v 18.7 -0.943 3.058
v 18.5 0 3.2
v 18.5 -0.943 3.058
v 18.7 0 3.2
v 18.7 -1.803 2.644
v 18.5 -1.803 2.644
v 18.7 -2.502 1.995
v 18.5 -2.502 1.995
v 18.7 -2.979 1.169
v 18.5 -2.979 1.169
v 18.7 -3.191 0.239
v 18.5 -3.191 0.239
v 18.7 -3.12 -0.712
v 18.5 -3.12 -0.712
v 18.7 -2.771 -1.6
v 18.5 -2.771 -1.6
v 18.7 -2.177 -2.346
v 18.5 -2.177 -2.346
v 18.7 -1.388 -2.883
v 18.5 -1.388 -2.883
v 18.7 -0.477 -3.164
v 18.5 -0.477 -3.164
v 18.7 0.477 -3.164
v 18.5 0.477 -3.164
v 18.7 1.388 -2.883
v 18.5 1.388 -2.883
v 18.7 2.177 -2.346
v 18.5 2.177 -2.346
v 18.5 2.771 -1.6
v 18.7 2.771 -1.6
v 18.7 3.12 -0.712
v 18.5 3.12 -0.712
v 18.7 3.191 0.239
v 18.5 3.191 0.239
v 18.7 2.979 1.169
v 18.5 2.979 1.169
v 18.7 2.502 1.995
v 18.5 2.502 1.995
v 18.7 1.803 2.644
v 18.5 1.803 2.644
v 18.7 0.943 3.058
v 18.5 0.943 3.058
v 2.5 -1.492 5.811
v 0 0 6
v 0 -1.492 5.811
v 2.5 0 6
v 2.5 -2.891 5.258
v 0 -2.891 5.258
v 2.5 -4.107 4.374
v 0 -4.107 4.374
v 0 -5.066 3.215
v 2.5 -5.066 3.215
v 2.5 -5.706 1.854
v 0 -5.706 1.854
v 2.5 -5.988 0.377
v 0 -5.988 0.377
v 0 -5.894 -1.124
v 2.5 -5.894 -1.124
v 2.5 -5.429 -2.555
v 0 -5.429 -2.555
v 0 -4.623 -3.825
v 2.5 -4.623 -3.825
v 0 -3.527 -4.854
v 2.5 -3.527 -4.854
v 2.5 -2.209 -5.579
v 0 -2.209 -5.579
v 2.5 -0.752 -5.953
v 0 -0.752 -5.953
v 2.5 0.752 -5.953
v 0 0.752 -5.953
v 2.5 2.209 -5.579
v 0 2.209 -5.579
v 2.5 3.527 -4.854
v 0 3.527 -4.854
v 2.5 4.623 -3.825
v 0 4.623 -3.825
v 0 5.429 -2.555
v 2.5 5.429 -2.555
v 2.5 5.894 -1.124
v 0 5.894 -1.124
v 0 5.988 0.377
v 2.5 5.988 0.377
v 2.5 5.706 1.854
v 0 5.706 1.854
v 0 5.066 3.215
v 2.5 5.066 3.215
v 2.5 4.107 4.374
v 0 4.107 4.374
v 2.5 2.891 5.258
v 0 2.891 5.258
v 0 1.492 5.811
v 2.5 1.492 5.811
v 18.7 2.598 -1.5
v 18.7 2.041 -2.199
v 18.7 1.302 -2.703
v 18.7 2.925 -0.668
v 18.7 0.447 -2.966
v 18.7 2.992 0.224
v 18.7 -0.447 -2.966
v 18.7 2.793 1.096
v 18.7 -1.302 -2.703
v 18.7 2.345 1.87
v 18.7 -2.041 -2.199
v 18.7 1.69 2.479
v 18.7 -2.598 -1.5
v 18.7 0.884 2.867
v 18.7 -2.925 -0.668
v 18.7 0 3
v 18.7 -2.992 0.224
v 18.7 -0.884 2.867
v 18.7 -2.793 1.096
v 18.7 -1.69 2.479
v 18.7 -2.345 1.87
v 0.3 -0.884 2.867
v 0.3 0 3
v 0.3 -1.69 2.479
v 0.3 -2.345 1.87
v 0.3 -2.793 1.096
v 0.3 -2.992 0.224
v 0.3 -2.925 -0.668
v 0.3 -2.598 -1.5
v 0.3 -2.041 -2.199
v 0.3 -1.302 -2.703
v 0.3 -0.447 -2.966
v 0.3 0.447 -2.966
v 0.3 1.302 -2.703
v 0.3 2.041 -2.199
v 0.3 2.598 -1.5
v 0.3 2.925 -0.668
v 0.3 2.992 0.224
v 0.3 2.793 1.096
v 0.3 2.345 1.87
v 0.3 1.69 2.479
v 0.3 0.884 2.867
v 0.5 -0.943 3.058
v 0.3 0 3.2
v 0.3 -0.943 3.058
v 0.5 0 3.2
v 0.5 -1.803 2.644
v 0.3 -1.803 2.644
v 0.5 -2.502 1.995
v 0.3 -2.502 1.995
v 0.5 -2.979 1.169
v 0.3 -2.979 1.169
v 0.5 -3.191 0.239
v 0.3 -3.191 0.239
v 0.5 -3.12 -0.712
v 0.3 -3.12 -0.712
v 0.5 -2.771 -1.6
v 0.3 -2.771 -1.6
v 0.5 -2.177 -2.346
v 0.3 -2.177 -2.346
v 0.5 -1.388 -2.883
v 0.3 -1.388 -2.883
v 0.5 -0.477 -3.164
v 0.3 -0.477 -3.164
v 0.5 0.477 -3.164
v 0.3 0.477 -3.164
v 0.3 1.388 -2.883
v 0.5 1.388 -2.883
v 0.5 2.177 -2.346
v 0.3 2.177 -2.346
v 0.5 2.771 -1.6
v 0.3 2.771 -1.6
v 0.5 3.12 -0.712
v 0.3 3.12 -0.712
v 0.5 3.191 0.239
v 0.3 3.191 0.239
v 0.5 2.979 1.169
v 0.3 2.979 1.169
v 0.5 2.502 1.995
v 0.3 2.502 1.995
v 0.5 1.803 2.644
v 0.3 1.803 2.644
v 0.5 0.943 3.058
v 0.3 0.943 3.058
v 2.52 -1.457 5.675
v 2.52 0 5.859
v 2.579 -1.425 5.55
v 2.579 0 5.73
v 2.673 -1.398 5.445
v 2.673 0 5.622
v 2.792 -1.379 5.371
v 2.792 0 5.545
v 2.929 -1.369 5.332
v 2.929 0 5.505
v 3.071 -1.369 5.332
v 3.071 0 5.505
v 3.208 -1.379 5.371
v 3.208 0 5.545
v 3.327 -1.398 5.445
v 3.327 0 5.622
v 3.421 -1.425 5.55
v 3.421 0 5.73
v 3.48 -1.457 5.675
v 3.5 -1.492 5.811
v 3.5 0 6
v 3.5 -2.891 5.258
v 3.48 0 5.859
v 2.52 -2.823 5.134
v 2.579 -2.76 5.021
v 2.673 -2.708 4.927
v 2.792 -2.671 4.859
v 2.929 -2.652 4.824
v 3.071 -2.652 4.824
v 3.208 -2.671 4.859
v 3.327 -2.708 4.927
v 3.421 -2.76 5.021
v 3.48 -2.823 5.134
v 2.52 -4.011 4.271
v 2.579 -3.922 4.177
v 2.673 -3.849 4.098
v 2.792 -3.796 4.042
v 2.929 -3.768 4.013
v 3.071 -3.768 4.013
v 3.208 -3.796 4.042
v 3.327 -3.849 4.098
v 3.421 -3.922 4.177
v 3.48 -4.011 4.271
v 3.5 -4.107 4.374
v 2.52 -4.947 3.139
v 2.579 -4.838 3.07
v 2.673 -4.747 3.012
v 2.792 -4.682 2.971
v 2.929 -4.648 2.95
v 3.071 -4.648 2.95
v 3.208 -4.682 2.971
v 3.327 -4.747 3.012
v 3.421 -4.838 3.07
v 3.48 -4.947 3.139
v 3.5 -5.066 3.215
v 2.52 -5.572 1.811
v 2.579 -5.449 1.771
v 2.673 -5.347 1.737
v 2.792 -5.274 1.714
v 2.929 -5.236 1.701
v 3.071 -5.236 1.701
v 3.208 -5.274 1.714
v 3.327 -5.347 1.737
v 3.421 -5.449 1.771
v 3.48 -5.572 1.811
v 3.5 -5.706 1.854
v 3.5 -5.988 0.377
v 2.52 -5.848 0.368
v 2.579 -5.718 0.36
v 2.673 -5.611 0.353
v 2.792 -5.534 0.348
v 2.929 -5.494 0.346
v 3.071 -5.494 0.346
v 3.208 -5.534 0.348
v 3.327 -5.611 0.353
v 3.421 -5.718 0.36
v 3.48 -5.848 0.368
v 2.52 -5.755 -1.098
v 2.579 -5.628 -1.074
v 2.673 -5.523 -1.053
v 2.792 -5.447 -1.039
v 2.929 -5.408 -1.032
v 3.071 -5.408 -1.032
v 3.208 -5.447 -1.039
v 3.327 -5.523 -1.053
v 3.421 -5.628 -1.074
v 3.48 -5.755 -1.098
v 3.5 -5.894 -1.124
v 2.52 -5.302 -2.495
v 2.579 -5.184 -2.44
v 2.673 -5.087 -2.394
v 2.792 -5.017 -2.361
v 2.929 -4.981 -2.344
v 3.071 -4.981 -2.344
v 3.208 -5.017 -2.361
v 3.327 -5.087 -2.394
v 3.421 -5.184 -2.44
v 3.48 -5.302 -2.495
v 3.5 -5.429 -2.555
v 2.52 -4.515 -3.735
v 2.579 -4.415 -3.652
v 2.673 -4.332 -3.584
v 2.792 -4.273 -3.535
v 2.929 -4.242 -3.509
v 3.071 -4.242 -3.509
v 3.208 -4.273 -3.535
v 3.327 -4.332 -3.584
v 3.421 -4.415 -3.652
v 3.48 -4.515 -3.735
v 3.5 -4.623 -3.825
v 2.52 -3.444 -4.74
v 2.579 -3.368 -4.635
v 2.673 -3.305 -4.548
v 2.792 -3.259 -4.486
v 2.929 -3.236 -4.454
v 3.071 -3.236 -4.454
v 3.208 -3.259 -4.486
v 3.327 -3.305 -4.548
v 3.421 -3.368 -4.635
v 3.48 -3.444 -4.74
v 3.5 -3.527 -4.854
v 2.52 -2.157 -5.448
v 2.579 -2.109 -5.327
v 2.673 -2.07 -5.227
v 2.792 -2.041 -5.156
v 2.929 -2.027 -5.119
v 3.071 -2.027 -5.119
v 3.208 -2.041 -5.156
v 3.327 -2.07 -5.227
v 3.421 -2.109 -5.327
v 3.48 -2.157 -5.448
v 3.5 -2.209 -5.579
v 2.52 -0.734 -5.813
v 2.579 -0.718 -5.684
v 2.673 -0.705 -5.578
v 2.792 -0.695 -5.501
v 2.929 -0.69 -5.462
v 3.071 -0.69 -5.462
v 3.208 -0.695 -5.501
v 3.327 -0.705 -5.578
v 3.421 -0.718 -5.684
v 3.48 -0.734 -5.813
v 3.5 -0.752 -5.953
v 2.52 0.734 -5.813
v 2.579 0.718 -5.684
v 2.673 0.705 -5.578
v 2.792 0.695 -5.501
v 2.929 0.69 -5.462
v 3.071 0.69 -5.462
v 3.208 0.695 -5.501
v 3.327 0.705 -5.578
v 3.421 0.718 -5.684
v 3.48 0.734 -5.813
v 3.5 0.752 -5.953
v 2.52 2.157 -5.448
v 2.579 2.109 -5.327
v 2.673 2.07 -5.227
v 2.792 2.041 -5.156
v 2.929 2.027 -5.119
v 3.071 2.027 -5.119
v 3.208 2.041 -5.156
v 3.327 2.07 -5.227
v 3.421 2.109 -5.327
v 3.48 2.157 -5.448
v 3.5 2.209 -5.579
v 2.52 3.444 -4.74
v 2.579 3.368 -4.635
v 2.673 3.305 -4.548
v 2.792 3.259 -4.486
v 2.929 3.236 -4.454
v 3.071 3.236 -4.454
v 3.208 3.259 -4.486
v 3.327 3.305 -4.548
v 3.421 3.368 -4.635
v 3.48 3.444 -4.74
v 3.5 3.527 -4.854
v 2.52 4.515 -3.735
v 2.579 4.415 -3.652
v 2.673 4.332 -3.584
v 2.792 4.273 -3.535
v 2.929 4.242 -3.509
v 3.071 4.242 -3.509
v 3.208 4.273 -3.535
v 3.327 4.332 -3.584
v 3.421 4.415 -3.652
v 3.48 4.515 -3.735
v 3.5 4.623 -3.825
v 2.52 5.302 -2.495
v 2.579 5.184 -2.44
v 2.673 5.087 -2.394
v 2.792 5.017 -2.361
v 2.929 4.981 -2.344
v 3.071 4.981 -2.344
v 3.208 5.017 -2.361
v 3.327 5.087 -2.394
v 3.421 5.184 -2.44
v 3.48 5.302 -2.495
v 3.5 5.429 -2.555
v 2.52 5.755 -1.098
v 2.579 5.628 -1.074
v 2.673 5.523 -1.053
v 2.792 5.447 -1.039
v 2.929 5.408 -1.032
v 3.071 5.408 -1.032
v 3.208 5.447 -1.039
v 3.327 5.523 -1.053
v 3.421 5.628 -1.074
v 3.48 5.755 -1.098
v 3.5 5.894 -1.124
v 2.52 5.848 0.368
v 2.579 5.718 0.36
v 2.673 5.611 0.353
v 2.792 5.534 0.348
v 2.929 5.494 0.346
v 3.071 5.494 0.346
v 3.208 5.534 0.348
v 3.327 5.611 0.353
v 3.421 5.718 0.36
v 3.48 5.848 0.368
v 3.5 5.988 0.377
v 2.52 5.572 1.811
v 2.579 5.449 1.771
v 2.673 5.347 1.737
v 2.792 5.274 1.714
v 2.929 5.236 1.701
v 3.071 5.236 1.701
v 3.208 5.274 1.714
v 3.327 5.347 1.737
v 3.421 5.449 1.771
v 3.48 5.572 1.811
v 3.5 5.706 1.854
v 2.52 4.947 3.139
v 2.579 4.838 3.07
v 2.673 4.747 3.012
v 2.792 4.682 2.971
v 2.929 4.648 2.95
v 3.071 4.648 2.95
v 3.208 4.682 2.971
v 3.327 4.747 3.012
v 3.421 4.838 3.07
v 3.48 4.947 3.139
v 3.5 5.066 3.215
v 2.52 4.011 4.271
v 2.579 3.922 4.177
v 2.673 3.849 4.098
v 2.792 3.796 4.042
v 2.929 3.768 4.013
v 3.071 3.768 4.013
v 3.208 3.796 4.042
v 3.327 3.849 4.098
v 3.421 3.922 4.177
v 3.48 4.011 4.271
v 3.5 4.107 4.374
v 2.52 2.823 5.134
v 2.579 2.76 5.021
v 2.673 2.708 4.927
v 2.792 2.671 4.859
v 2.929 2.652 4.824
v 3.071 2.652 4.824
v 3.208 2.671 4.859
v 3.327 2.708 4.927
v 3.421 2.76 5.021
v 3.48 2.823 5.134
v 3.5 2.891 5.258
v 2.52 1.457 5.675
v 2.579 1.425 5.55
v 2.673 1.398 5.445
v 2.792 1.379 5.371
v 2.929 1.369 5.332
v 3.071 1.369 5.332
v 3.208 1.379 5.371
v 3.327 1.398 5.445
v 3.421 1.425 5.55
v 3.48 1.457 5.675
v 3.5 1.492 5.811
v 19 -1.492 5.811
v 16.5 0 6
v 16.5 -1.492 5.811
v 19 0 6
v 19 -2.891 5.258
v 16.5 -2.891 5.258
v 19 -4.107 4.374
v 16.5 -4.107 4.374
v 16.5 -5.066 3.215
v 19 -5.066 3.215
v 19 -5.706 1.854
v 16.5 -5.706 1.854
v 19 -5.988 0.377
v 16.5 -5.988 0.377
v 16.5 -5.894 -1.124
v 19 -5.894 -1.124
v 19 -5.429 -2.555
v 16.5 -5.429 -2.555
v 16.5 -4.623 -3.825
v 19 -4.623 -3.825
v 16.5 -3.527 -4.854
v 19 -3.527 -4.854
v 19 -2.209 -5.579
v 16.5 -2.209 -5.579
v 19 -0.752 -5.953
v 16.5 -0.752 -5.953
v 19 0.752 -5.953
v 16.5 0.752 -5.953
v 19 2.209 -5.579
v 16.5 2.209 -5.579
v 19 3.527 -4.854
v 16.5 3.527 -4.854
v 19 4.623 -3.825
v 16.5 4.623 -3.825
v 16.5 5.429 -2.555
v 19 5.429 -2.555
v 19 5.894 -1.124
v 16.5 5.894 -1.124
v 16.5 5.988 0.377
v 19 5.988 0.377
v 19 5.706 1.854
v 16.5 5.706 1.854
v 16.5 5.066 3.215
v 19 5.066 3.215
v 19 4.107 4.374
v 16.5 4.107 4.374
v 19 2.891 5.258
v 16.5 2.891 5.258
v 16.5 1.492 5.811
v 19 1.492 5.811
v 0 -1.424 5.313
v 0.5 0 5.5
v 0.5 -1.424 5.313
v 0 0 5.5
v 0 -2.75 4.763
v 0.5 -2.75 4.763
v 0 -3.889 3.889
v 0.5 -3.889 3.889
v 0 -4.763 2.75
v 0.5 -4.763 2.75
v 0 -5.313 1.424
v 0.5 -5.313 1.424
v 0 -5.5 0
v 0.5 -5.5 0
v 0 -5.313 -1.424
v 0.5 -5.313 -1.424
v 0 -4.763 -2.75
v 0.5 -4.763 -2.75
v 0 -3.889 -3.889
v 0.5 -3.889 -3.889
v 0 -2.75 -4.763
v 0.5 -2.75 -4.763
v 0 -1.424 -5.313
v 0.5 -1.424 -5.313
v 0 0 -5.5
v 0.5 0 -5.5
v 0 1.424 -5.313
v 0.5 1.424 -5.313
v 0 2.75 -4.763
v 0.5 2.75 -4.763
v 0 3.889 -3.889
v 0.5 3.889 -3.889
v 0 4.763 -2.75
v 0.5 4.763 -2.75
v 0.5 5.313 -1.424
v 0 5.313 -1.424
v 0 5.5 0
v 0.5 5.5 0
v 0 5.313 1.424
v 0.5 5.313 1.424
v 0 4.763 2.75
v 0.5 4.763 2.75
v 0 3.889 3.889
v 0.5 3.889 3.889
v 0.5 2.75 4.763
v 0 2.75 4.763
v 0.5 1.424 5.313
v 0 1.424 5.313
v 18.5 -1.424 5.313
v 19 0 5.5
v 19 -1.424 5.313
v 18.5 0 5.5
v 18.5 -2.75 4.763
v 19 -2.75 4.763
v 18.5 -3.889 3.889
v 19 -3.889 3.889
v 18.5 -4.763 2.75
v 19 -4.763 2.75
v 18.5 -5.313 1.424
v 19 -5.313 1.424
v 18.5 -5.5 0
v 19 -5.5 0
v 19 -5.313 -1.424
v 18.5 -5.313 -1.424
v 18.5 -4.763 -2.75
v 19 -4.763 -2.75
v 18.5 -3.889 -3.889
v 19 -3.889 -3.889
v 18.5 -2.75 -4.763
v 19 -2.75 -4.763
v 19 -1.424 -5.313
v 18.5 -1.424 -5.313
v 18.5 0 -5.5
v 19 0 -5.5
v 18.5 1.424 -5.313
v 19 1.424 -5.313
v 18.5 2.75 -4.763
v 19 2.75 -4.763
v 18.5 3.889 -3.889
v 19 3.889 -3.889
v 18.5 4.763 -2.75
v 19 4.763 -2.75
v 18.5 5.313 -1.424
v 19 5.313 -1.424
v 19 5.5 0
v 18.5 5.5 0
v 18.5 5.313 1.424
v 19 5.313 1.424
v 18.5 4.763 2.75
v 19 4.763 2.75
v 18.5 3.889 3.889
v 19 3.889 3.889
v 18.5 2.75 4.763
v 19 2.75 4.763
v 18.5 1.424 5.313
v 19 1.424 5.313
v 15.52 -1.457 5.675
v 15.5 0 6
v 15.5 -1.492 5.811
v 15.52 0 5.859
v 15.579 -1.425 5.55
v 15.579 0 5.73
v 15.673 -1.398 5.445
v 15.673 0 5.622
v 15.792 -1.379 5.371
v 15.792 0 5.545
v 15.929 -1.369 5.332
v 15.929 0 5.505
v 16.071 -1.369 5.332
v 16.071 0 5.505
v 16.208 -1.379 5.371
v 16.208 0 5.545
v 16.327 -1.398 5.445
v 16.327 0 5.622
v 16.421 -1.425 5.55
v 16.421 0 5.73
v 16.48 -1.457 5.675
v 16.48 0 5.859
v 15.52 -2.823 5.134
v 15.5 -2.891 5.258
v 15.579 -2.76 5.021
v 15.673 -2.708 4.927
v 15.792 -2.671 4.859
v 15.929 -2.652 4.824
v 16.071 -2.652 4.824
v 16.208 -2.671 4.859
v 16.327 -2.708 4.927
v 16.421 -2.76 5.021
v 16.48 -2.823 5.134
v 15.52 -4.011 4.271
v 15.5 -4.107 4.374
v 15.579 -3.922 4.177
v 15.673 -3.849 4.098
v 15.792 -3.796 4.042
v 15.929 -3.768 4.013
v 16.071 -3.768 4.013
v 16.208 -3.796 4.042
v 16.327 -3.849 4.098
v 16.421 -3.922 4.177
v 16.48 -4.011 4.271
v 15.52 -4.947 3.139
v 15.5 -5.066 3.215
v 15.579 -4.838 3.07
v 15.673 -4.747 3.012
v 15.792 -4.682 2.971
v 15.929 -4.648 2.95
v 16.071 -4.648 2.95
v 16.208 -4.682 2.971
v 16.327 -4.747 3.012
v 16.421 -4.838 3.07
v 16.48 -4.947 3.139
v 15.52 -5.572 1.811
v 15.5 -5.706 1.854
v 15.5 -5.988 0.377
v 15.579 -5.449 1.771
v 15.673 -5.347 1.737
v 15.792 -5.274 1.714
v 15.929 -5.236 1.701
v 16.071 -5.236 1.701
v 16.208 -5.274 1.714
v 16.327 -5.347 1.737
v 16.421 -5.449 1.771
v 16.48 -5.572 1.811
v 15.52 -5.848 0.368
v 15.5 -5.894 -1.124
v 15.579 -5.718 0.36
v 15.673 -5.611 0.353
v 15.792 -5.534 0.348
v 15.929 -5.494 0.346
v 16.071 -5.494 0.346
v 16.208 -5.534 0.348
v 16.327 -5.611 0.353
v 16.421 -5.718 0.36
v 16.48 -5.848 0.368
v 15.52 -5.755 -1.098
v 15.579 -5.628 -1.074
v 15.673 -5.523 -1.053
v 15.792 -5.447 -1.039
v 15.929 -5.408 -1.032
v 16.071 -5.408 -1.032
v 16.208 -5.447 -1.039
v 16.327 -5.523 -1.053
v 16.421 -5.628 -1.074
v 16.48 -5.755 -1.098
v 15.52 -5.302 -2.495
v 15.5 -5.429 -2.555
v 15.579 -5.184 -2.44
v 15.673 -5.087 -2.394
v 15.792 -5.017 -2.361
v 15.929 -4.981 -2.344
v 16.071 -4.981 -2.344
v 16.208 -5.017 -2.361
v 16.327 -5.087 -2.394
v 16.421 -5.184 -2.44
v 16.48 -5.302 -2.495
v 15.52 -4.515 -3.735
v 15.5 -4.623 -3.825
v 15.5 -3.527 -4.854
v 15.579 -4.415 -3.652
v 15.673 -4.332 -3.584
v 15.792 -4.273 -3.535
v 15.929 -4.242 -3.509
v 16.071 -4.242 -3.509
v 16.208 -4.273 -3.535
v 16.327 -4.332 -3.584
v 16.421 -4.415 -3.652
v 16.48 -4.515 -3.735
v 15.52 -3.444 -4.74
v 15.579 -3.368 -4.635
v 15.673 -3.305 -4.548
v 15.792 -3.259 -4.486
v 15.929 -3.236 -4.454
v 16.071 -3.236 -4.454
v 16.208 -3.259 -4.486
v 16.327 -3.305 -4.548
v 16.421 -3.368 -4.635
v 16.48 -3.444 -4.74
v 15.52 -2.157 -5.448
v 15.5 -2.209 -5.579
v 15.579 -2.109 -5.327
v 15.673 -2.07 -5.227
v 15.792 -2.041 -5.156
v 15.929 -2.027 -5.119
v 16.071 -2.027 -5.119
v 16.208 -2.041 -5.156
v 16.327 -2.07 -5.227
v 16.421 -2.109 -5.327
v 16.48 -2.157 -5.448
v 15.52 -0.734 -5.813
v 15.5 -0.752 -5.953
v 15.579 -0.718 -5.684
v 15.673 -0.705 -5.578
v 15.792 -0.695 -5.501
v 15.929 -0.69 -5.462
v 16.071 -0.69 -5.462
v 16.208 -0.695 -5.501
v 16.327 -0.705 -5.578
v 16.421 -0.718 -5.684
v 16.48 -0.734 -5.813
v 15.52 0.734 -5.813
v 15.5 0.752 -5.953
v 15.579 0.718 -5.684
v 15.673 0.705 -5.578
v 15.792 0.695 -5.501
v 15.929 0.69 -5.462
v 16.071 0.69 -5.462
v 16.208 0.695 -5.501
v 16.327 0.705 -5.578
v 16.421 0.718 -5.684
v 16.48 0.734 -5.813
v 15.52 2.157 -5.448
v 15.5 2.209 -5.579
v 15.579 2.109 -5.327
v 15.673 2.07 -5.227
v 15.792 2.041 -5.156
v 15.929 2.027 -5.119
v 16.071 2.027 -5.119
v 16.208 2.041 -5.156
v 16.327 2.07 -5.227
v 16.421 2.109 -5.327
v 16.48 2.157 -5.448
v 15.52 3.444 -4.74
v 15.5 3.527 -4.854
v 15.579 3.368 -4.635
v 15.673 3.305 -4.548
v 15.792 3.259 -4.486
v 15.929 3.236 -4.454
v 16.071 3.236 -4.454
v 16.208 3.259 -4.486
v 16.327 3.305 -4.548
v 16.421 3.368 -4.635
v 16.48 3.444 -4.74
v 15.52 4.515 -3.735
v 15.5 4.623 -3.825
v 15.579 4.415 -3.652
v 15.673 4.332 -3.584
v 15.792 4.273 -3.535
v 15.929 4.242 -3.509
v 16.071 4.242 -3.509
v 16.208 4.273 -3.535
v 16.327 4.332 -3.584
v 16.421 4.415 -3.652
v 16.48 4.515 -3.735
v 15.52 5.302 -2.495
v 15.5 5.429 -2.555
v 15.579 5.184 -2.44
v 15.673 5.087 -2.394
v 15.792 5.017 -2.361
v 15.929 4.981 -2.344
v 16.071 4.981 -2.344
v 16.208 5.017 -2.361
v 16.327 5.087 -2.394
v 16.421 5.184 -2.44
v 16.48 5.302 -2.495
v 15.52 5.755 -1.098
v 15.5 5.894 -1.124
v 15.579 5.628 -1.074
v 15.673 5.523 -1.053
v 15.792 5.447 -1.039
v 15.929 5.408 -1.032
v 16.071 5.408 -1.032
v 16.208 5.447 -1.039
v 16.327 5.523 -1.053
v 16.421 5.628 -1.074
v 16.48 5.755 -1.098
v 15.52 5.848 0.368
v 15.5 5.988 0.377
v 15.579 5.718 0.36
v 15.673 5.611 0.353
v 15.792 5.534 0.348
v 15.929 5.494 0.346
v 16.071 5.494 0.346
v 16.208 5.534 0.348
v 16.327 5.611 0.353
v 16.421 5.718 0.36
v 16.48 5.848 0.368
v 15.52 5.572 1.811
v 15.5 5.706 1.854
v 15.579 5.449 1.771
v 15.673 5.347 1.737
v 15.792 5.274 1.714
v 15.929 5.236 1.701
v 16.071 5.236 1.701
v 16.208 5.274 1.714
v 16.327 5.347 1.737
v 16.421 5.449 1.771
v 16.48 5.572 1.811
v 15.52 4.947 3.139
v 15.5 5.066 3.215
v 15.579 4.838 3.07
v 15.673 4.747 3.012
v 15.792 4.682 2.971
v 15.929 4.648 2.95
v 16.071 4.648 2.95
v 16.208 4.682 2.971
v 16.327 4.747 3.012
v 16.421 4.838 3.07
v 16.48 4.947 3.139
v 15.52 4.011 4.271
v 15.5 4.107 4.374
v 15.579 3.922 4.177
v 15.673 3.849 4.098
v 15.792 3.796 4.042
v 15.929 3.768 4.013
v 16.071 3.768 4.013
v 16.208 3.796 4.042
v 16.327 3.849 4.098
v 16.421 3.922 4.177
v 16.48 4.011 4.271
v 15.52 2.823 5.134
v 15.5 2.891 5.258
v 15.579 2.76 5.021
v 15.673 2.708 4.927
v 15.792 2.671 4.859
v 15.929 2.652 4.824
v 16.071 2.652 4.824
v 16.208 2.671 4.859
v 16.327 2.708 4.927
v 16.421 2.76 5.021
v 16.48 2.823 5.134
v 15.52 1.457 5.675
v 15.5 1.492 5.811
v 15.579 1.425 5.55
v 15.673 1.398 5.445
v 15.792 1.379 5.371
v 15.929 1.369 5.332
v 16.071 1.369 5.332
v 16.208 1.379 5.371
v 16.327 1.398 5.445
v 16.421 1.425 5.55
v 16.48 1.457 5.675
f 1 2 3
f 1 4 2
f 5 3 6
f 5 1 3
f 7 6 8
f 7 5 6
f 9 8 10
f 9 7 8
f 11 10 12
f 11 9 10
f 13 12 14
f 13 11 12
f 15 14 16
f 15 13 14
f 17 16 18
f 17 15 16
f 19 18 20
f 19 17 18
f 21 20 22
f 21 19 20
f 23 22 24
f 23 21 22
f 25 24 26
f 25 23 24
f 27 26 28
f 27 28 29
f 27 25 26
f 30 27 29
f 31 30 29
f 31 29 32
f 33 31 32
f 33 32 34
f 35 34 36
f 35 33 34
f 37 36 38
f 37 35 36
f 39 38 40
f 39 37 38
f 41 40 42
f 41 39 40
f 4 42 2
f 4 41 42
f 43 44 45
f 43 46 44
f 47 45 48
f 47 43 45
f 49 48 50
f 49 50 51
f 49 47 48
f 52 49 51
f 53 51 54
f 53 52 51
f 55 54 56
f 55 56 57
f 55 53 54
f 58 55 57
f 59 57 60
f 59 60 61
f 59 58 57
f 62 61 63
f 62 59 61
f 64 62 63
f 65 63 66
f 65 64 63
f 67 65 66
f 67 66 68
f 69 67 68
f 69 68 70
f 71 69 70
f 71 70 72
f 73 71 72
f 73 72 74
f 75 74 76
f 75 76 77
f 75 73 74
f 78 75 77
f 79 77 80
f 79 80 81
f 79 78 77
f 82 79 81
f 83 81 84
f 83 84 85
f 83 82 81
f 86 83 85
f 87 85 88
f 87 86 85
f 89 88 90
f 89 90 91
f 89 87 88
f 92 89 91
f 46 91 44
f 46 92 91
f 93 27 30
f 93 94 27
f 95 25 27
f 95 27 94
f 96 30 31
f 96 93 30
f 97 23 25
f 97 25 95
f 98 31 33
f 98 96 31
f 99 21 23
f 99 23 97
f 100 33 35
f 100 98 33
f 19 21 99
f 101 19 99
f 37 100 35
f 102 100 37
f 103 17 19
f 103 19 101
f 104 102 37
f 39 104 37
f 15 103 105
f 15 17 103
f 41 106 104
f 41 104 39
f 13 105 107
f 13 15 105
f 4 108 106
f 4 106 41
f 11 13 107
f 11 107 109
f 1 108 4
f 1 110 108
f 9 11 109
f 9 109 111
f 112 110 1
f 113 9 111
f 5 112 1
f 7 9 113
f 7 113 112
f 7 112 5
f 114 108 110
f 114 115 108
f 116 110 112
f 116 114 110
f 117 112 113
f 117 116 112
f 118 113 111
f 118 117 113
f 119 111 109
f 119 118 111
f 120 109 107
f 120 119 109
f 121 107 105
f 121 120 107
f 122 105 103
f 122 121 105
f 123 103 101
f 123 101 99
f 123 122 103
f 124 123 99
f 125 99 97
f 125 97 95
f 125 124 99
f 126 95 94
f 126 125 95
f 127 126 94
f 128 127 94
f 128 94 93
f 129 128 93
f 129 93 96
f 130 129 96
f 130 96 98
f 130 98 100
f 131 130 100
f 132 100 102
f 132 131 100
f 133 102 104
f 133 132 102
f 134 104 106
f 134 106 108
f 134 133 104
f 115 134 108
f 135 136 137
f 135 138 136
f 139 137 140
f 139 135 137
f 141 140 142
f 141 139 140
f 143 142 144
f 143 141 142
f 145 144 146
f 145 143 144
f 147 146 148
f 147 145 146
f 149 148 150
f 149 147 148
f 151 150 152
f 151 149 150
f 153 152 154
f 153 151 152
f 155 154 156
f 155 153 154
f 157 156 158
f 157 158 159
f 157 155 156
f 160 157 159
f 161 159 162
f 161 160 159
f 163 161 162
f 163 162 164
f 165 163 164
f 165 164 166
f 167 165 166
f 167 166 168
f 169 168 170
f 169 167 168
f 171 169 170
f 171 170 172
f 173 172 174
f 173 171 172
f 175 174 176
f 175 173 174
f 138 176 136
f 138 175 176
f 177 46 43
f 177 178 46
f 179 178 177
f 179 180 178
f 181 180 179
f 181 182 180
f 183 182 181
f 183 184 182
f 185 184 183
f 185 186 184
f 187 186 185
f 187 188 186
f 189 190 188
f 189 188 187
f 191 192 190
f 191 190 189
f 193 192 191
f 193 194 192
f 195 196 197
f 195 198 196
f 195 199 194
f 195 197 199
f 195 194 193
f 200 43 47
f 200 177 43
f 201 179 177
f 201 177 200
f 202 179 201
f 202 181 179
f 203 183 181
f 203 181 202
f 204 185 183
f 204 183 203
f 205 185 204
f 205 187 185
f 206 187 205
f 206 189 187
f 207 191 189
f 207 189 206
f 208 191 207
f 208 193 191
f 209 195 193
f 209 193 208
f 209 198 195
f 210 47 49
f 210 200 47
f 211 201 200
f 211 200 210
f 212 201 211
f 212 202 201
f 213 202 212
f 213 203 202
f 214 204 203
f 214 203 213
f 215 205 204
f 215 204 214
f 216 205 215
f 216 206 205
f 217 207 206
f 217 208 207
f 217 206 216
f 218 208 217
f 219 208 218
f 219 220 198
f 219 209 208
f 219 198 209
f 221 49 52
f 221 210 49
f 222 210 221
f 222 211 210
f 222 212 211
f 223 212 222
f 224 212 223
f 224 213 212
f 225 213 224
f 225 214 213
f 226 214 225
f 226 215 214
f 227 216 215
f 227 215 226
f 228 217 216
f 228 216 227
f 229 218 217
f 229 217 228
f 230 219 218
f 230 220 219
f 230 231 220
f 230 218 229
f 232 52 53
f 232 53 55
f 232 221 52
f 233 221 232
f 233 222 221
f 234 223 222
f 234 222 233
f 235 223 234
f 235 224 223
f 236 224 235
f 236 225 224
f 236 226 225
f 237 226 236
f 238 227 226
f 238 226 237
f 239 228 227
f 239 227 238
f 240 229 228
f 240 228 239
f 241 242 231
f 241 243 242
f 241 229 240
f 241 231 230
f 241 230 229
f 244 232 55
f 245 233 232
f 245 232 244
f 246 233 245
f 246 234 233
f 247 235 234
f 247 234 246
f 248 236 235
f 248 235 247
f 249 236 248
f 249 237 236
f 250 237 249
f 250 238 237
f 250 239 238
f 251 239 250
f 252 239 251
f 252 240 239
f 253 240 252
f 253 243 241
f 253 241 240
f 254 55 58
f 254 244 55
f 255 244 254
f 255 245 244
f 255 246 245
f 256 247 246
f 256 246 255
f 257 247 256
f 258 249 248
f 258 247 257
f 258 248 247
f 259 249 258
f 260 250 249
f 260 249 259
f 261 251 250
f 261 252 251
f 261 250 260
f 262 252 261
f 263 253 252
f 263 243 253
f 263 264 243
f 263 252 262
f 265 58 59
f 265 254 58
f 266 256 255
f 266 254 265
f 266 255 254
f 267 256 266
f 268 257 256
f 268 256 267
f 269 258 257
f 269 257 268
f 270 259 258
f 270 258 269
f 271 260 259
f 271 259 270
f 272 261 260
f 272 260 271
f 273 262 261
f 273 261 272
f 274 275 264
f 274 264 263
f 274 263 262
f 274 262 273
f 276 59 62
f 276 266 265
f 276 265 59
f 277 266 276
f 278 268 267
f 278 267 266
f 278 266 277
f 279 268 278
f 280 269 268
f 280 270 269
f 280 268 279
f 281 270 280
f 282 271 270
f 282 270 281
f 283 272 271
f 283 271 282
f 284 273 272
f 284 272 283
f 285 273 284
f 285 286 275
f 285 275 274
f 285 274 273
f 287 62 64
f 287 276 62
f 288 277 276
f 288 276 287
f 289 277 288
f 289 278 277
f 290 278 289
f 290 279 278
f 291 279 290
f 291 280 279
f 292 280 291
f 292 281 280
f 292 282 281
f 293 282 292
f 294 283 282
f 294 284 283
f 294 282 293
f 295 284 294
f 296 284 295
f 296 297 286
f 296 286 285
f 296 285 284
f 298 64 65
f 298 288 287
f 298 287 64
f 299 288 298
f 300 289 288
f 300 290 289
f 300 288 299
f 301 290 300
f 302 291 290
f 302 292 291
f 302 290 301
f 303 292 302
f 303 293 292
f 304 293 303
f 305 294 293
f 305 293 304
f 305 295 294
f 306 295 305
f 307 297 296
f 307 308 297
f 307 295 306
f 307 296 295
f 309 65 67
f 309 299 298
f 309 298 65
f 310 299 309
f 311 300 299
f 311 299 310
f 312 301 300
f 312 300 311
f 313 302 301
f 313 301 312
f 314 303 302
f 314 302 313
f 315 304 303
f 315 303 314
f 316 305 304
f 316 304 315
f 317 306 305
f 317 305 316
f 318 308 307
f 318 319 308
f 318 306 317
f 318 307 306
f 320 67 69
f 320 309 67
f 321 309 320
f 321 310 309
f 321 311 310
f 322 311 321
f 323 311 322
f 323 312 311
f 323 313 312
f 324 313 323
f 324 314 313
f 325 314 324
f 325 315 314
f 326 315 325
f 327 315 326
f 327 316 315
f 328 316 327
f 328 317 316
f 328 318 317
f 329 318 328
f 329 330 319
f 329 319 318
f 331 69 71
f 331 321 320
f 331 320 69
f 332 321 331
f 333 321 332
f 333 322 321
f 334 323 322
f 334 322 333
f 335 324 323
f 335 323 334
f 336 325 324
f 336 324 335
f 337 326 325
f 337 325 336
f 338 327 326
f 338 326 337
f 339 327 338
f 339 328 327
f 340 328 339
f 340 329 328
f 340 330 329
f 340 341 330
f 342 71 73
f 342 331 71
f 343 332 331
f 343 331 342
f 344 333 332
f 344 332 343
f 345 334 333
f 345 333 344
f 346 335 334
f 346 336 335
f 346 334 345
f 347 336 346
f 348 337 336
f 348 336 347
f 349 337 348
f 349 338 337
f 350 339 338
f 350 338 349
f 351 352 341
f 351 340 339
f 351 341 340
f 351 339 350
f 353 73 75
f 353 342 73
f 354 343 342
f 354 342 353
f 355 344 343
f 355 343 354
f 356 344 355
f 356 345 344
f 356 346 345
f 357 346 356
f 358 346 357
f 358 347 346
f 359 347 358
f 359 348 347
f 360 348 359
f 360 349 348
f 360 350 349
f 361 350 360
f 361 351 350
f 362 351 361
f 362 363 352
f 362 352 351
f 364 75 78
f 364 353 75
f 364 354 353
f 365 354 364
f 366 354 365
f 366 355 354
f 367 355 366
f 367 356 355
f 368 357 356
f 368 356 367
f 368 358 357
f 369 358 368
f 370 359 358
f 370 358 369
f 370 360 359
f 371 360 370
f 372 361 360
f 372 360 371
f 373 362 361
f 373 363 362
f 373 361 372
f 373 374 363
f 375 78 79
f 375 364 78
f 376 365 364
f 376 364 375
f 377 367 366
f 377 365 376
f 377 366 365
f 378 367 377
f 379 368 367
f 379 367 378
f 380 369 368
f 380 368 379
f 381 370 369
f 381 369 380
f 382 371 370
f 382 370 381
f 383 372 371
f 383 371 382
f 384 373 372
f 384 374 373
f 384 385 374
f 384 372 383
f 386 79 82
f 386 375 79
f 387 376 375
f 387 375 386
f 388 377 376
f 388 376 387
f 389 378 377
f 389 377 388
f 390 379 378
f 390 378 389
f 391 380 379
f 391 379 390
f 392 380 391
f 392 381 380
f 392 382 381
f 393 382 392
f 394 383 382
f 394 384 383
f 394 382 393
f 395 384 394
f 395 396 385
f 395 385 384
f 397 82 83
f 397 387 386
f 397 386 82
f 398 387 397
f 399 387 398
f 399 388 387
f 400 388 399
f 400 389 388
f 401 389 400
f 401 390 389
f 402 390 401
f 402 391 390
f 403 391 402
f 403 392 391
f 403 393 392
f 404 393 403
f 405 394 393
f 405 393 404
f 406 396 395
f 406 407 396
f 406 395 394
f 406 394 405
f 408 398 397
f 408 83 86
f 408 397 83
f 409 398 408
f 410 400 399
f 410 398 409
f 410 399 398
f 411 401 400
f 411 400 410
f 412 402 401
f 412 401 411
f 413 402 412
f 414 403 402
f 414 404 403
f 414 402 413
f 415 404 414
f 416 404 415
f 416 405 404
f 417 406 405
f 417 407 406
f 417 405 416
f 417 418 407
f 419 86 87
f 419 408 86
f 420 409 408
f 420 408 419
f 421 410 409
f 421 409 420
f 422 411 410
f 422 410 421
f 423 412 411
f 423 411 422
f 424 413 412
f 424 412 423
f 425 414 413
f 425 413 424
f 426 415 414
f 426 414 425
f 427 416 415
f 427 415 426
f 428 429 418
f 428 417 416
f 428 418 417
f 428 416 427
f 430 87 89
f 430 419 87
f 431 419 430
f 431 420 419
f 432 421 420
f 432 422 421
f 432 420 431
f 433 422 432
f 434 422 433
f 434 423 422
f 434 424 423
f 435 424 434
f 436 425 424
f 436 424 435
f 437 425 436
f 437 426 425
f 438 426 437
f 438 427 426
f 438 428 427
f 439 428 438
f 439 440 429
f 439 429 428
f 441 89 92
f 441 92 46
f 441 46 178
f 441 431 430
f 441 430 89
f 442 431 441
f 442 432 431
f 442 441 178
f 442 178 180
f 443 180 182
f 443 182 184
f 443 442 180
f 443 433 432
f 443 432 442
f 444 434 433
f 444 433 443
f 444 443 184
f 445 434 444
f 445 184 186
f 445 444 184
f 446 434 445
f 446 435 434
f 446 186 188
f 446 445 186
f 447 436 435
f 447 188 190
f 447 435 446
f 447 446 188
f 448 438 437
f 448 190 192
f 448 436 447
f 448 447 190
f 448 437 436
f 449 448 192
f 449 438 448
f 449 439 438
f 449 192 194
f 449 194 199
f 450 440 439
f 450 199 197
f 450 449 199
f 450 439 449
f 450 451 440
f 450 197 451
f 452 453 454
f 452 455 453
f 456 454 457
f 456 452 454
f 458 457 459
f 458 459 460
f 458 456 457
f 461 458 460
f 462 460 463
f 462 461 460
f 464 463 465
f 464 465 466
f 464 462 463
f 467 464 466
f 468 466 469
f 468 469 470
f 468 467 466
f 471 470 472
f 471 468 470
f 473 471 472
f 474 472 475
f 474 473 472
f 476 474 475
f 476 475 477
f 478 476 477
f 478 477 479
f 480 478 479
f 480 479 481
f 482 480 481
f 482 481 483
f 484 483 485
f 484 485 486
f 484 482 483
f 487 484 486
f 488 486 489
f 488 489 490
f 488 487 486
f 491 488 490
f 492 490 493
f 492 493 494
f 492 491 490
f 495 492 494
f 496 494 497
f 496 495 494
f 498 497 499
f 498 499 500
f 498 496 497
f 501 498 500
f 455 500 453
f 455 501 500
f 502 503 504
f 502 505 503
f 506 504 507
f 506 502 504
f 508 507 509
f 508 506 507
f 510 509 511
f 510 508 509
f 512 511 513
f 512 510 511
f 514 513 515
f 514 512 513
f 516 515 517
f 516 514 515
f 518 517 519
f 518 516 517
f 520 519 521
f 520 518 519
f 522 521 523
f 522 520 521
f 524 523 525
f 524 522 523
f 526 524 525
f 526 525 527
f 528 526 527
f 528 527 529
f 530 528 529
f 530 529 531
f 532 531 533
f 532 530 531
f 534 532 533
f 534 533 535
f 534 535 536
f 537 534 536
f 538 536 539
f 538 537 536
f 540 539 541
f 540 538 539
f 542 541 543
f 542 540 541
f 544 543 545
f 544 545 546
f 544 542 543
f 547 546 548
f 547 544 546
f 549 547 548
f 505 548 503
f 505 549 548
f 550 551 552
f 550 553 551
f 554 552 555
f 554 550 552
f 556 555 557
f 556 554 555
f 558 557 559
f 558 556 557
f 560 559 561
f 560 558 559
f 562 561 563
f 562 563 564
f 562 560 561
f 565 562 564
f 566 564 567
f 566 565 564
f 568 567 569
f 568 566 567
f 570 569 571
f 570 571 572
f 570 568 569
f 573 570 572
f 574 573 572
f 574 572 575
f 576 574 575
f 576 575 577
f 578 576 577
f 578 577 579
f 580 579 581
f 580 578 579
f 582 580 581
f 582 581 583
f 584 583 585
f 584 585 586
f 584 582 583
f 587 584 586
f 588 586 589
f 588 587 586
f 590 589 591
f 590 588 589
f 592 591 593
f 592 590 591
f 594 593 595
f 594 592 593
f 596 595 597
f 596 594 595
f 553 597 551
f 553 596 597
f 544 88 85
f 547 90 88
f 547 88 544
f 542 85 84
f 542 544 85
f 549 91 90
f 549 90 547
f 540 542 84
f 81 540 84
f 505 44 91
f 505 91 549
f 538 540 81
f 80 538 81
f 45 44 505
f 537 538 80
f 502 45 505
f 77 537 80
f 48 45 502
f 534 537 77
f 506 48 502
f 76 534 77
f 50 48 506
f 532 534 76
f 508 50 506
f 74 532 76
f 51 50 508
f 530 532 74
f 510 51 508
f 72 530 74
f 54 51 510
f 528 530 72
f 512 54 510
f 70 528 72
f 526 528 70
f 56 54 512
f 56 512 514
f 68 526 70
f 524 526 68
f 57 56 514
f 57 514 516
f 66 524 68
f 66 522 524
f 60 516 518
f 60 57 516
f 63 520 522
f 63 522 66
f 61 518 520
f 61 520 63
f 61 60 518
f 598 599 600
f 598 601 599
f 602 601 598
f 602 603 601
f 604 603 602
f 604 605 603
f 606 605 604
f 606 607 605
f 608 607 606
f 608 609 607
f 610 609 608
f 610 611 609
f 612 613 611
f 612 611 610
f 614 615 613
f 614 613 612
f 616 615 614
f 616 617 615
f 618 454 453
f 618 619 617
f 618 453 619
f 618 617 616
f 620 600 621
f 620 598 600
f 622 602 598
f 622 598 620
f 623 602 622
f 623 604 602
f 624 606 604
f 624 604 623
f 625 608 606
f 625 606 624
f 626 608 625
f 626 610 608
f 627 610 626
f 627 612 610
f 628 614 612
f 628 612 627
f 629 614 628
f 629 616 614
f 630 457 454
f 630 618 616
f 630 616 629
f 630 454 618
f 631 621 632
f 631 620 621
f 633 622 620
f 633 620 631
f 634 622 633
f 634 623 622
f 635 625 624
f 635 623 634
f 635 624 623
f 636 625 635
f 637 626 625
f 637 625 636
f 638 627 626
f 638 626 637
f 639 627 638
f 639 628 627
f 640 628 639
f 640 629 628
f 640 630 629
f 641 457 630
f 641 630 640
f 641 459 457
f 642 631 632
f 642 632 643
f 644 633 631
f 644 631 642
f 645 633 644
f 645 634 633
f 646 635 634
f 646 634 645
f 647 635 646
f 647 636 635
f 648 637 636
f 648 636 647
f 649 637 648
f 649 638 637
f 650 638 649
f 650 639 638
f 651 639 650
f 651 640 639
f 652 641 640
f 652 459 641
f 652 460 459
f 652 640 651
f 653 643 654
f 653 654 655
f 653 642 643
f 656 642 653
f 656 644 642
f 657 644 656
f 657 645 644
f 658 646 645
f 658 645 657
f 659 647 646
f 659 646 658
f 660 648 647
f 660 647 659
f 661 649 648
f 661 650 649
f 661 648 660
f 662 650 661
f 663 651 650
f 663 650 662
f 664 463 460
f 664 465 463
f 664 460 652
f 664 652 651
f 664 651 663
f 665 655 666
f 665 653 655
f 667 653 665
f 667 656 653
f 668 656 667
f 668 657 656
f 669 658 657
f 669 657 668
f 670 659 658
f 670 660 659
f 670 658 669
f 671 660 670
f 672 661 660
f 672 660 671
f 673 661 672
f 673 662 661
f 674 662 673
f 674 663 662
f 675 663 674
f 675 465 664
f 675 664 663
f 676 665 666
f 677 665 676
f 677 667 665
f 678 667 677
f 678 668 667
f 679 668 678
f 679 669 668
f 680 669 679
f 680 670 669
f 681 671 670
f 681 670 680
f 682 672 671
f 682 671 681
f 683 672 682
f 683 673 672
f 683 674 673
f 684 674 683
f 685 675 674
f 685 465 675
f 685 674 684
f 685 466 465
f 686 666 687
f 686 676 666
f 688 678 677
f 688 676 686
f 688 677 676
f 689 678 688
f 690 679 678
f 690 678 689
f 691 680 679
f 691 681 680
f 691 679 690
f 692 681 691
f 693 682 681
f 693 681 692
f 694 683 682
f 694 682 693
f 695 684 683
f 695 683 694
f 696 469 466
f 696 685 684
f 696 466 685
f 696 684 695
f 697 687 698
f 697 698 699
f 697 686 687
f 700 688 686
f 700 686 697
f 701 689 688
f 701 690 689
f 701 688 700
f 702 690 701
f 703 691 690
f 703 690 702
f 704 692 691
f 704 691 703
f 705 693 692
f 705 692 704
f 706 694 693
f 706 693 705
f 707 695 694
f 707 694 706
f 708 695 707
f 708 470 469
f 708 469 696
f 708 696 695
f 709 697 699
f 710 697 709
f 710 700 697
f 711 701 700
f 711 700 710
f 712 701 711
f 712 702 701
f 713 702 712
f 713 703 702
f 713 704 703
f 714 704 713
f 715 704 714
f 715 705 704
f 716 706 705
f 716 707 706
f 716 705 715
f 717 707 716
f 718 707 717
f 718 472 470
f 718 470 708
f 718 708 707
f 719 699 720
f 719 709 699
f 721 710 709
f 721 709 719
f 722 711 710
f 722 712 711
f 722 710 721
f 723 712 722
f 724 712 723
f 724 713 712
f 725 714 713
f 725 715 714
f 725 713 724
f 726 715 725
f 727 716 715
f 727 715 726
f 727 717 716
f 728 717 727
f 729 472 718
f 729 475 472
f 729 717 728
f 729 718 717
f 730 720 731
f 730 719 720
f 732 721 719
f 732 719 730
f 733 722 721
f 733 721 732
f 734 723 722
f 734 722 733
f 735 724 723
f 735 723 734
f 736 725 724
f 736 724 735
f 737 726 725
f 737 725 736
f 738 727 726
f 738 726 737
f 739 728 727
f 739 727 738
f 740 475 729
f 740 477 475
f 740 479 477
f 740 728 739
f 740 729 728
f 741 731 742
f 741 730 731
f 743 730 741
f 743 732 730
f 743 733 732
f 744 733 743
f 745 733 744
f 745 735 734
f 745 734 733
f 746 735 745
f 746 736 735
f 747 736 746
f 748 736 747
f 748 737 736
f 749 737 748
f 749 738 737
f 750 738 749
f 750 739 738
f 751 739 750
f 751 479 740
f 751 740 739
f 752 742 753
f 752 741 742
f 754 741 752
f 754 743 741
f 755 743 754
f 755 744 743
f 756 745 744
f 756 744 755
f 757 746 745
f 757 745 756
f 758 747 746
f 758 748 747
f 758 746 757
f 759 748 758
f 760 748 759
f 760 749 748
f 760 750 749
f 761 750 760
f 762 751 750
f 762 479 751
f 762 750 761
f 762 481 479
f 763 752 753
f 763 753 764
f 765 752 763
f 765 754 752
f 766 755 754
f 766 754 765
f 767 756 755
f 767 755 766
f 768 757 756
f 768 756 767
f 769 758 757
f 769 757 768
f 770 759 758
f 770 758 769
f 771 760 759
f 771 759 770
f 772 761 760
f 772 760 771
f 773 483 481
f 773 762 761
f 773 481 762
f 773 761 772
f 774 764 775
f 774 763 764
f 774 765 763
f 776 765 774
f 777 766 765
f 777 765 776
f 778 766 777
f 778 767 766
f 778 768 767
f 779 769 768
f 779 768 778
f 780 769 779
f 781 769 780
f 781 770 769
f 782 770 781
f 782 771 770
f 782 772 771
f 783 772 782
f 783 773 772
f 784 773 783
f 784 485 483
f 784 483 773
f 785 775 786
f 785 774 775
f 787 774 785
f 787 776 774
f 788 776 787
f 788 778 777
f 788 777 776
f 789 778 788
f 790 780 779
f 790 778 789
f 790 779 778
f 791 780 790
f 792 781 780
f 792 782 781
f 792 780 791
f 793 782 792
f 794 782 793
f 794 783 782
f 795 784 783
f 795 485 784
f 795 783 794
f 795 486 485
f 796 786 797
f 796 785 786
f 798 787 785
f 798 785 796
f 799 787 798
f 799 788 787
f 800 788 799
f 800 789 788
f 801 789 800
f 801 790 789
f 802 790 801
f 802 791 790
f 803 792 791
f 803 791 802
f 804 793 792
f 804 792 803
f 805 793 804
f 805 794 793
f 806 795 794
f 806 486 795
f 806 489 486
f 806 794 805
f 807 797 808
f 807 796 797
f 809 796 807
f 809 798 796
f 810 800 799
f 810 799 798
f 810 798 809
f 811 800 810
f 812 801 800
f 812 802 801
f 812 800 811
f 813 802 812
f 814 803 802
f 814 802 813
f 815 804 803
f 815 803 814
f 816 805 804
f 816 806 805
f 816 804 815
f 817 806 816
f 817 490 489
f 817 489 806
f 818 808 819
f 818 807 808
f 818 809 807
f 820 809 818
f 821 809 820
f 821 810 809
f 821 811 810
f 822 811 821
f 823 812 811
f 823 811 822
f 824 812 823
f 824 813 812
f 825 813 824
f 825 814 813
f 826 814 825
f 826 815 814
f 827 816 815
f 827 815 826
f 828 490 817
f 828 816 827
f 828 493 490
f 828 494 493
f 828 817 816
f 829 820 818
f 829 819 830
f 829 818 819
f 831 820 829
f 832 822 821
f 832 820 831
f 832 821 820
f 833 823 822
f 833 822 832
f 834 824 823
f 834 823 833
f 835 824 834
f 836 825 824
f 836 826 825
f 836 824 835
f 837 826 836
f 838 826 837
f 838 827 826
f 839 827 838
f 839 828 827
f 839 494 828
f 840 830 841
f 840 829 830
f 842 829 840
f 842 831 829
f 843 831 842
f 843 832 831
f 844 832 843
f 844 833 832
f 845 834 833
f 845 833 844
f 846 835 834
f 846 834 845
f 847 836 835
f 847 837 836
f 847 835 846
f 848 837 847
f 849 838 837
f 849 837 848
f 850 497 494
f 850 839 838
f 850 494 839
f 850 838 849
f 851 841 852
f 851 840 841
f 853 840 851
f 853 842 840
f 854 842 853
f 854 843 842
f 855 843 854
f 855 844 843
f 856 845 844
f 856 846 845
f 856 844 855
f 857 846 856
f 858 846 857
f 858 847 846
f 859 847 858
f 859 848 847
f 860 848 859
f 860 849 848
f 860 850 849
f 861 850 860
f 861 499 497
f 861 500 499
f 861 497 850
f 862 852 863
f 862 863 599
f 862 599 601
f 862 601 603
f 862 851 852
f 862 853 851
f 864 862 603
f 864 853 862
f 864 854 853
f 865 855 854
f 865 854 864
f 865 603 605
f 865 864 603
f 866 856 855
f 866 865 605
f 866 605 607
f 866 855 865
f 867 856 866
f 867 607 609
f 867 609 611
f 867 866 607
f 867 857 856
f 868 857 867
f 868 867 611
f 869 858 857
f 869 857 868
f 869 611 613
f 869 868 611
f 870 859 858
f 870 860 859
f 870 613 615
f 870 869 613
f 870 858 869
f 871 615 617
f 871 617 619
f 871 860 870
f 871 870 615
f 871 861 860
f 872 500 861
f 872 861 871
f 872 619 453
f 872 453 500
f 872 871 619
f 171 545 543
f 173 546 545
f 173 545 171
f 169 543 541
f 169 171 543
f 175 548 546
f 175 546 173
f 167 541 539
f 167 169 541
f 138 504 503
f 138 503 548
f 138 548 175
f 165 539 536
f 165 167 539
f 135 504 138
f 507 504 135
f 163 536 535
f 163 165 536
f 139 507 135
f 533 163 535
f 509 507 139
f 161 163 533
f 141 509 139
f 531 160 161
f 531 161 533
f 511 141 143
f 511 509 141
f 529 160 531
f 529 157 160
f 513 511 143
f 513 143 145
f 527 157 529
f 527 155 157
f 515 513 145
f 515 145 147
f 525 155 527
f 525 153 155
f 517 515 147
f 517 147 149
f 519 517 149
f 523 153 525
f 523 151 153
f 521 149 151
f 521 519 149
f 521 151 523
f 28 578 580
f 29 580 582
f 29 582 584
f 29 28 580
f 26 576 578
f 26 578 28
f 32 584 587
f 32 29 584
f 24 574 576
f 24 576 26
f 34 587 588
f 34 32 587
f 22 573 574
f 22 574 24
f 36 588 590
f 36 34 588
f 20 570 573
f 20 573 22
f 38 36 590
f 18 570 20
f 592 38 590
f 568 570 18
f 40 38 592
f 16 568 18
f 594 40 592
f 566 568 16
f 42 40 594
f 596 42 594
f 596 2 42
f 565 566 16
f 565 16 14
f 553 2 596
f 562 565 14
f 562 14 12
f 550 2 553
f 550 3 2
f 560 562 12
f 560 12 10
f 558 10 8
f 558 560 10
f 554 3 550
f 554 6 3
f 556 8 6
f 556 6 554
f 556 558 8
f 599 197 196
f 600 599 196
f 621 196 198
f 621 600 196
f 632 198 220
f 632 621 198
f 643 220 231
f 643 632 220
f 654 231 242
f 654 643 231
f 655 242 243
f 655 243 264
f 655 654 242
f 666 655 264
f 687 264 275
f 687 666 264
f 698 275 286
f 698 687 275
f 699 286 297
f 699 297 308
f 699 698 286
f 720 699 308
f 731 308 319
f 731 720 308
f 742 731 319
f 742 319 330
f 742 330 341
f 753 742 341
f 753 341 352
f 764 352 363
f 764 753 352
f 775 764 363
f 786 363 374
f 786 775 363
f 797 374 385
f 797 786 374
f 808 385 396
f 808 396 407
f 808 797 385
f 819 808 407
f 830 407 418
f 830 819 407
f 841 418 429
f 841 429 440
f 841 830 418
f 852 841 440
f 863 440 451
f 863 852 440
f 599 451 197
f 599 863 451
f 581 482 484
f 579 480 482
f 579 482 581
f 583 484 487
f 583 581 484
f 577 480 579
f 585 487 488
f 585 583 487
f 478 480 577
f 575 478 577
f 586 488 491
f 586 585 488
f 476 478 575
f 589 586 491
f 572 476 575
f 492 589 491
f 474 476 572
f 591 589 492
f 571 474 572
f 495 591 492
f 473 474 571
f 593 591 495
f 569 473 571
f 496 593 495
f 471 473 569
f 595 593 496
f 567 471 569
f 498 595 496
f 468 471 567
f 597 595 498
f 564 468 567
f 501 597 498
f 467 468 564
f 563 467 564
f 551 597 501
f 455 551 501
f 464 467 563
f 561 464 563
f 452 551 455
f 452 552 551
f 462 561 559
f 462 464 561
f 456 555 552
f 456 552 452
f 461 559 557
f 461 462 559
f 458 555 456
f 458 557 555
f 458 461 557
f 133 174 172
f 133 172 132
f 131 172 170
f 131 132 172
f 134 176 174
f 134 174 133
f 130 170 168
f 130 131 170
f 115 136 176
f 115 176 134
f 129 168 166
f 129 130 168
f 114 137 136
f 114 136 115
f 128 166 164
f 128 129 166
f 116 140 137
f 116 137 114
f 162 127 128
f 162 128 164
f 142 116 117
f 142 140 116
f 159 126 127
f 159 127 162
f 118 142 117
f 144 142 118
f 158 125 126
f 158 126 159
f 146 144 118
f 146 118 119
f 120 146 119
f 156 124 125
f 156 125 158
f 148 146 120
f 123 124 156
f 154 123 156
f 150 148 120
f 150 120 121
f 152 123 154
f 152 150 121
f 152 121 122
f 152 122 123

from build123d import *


with BuildPart() as part:
    # Sketch1 → Revolve3 (revolve)
    with BuildSketch(Plane.XY, mode=Mode.PRIVATE) as revolve3_sk:
        with BuildLine():
            Line((3.5, 6), (15.5, 6))
            ThreePointArc((15.5, 6), (16, 5.5), (16.5, 6))
            Line((16.5, 6), (19, 6))
            Line((19, 6), (19, 5.5))
            Line((19, 5.5), (18.5, 5.5))
            Line((18.5, 5.5), (18.5, 3.2))
            Line((18.5, 3.2), (18.7, 3.2))
            Line((18.7, 3.2), (18.7, 3))
            Line((18.7, 3), (0.3, 3))
            Line((0.3, 3), (0.3, 3.2))
            Line((0.3, 3.2), (0.5, 3.2))
            Line((0.5, 3.2), (0.5, 5.5))
            Line((0.5, 5.5), (0, 5.5))
            Line((0, 5.5), (0, 6))
            Line((0, 6), (2.5, 6))
            ThreePointArc((2.5, 6), (3, 5.5), (3.5, 6))
        make_face()
    revolve(revolve3_sk.sketch.rotate(Axis((-0.95, 0, 0), (1, 0, 0)), 90), axis=Axis((-0.95, 0, 0), (1, 0, 0)))


solid = part.part
